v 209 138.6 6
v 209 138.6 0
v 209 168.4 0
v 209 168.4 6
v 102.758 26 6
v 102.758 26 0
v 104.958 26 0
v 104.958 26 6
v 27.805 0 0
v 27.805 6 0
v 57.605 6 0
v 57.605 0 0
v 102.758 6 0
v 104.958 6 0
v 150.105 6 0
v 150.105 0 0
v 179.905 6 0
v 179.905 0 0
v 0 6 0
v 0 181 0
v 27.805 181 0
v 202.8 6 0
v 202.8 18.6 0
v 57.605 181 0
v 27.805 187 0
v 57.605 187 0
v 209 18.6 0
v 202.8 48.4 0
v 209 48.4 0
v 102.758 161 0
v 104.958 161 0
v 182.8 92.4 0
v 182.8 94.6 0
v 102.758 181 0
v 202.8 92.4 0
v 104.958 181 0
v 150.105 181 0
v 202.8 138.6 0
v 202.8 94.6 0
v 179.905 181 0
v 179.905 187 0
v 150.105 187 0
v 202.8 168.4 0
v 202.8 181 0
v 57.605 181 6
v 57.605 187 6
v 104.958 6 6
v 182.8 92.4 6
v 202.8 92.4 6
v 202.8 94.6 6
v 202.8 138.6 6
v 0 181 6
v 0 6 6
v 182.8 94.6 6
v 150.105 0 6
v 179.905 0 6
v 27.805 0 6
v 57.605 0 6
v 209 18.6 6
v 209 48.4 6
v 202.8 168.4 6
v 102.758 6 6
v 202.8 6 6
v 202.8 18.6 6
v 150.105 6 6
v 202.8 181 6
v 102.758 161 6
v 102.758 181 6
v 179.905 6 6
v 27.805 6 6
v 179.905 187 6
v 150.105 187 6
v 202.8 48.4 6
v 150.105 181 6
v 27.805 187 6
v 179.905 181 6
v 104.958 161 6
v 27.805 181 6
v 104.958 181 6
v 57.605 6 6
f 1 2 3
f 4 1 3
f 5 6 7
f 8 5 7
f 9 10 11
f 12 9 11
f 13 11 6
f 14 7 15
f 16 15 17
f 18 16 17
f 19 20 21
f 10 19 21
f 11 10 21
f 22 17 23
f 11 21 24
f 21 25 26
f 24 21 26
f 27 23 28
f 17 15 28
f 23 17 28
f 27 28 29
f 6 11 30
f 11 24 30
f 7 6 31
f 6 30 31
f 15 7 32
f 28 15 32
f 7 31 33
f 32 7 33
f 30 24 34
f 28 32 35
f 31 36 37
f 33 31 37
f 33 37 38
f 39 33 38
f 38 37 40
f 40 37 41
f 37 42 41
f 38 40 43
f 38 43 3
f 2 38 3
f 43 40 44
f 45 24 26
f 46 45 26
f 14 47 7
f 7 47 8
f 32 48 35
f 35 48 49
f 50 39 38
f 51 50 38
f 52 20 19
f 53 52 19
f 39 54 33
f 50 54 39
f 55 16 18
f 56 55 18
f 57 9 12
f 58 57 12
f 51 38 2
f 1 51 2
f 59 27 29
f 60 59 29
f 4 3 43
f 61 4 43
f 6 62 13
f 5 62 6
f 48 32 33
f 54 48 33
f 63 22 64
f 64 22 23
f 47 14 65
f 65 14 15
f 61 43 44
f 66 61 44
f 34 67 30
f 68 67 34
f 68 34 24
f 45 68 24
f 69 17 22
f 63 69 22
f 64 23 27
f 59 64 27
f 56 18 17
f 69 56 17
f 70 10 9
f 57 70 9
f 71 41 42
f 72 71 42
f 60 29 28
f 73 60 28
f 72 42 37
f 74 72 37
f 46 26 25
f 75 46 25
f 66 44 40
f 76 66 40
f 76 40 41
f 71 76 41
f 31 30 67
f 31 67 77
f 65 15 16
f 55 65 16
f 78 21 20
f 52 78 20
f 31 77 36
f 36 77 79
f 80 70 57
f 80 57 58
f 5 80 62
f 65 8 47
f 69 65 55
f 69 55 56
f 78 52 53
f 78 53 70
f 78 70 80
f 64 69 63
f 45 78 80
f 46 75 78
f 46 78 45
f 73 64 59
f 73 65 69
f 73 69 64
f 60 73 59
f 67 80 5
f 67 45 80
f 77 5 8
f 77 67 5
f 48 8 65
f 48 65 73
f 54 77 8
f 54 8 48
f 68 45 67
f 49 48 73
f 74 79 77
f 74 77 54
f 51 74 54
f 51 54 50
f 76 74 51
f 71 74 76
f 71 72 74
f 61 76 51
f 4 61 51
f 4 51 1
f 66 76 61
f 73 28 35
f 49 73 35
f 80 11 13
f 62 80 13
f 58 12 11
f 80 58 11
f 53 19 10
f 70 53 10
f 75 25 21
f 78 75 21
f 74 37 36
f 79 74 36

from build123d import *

# Parameters (mm, degrees)
RESSALTO_EXTRUS_O1_DEPTH = 6
ESBO_O2_W                = 2.2
ESBO_O2_H                = 20
ESBO_O2_W_2              = 20
ESBO_O2_H_2              = 2.2
CORTE_EXTRUS_O1_DEPTH    = 6


with BuildPart() as part:
    # Esboço1 → Ressalto-extrusão1 (new body)
    with BuildSketch(Plane.XY):
        Polygon((150.105265805, 0), (179.905265805, 0), (179.905265805, 6), (202.8, 6), (202.8, 18.6), (209, 18.6), (209, 48.4), (202.8, 48.4), (202.8, 138.6), (209, 138.6), (209, 168.4), (202.8, 168.4), (202.8, 181), (179.905265805, 181), (179.905265805, 187), (150.105265805, 187), (150.105265805, 181), (57.605265805, 181), (57.605265805, 187), (27.805265805, 187), (27.805265805, 181), (0, 181), (0, 6), (27.805265805, 6), (27.805265805, 0), (57.605265805, 0), (57.605265805, 6), (150.105265805, 6), align=None)
    extrude(amount=RESSALTO_EXTRUS_O1_DEPTH)

    # Esboço2 → Corte-extrusão1 (cut)
    with BuildSketch(Plane.XY.offset(6)):
        with Locations((103.857898708, 171)):
            Rectangle(ESBO_O2_W, ESBO_O2_H)
        with Locations((192.8, 93.5)):
            Rectangle(ESBO_O2_W_2, ESBO_O2_H_2)
        with Locations((103.857898708, 16)):
            Rectangle(ESBO_O2_W, ESBO_O2_H)
    extrude(amount=-CORTE_EXTRUS_O1_DEPTH, mode=Mode.SUBTRACT)


solid = part.part
